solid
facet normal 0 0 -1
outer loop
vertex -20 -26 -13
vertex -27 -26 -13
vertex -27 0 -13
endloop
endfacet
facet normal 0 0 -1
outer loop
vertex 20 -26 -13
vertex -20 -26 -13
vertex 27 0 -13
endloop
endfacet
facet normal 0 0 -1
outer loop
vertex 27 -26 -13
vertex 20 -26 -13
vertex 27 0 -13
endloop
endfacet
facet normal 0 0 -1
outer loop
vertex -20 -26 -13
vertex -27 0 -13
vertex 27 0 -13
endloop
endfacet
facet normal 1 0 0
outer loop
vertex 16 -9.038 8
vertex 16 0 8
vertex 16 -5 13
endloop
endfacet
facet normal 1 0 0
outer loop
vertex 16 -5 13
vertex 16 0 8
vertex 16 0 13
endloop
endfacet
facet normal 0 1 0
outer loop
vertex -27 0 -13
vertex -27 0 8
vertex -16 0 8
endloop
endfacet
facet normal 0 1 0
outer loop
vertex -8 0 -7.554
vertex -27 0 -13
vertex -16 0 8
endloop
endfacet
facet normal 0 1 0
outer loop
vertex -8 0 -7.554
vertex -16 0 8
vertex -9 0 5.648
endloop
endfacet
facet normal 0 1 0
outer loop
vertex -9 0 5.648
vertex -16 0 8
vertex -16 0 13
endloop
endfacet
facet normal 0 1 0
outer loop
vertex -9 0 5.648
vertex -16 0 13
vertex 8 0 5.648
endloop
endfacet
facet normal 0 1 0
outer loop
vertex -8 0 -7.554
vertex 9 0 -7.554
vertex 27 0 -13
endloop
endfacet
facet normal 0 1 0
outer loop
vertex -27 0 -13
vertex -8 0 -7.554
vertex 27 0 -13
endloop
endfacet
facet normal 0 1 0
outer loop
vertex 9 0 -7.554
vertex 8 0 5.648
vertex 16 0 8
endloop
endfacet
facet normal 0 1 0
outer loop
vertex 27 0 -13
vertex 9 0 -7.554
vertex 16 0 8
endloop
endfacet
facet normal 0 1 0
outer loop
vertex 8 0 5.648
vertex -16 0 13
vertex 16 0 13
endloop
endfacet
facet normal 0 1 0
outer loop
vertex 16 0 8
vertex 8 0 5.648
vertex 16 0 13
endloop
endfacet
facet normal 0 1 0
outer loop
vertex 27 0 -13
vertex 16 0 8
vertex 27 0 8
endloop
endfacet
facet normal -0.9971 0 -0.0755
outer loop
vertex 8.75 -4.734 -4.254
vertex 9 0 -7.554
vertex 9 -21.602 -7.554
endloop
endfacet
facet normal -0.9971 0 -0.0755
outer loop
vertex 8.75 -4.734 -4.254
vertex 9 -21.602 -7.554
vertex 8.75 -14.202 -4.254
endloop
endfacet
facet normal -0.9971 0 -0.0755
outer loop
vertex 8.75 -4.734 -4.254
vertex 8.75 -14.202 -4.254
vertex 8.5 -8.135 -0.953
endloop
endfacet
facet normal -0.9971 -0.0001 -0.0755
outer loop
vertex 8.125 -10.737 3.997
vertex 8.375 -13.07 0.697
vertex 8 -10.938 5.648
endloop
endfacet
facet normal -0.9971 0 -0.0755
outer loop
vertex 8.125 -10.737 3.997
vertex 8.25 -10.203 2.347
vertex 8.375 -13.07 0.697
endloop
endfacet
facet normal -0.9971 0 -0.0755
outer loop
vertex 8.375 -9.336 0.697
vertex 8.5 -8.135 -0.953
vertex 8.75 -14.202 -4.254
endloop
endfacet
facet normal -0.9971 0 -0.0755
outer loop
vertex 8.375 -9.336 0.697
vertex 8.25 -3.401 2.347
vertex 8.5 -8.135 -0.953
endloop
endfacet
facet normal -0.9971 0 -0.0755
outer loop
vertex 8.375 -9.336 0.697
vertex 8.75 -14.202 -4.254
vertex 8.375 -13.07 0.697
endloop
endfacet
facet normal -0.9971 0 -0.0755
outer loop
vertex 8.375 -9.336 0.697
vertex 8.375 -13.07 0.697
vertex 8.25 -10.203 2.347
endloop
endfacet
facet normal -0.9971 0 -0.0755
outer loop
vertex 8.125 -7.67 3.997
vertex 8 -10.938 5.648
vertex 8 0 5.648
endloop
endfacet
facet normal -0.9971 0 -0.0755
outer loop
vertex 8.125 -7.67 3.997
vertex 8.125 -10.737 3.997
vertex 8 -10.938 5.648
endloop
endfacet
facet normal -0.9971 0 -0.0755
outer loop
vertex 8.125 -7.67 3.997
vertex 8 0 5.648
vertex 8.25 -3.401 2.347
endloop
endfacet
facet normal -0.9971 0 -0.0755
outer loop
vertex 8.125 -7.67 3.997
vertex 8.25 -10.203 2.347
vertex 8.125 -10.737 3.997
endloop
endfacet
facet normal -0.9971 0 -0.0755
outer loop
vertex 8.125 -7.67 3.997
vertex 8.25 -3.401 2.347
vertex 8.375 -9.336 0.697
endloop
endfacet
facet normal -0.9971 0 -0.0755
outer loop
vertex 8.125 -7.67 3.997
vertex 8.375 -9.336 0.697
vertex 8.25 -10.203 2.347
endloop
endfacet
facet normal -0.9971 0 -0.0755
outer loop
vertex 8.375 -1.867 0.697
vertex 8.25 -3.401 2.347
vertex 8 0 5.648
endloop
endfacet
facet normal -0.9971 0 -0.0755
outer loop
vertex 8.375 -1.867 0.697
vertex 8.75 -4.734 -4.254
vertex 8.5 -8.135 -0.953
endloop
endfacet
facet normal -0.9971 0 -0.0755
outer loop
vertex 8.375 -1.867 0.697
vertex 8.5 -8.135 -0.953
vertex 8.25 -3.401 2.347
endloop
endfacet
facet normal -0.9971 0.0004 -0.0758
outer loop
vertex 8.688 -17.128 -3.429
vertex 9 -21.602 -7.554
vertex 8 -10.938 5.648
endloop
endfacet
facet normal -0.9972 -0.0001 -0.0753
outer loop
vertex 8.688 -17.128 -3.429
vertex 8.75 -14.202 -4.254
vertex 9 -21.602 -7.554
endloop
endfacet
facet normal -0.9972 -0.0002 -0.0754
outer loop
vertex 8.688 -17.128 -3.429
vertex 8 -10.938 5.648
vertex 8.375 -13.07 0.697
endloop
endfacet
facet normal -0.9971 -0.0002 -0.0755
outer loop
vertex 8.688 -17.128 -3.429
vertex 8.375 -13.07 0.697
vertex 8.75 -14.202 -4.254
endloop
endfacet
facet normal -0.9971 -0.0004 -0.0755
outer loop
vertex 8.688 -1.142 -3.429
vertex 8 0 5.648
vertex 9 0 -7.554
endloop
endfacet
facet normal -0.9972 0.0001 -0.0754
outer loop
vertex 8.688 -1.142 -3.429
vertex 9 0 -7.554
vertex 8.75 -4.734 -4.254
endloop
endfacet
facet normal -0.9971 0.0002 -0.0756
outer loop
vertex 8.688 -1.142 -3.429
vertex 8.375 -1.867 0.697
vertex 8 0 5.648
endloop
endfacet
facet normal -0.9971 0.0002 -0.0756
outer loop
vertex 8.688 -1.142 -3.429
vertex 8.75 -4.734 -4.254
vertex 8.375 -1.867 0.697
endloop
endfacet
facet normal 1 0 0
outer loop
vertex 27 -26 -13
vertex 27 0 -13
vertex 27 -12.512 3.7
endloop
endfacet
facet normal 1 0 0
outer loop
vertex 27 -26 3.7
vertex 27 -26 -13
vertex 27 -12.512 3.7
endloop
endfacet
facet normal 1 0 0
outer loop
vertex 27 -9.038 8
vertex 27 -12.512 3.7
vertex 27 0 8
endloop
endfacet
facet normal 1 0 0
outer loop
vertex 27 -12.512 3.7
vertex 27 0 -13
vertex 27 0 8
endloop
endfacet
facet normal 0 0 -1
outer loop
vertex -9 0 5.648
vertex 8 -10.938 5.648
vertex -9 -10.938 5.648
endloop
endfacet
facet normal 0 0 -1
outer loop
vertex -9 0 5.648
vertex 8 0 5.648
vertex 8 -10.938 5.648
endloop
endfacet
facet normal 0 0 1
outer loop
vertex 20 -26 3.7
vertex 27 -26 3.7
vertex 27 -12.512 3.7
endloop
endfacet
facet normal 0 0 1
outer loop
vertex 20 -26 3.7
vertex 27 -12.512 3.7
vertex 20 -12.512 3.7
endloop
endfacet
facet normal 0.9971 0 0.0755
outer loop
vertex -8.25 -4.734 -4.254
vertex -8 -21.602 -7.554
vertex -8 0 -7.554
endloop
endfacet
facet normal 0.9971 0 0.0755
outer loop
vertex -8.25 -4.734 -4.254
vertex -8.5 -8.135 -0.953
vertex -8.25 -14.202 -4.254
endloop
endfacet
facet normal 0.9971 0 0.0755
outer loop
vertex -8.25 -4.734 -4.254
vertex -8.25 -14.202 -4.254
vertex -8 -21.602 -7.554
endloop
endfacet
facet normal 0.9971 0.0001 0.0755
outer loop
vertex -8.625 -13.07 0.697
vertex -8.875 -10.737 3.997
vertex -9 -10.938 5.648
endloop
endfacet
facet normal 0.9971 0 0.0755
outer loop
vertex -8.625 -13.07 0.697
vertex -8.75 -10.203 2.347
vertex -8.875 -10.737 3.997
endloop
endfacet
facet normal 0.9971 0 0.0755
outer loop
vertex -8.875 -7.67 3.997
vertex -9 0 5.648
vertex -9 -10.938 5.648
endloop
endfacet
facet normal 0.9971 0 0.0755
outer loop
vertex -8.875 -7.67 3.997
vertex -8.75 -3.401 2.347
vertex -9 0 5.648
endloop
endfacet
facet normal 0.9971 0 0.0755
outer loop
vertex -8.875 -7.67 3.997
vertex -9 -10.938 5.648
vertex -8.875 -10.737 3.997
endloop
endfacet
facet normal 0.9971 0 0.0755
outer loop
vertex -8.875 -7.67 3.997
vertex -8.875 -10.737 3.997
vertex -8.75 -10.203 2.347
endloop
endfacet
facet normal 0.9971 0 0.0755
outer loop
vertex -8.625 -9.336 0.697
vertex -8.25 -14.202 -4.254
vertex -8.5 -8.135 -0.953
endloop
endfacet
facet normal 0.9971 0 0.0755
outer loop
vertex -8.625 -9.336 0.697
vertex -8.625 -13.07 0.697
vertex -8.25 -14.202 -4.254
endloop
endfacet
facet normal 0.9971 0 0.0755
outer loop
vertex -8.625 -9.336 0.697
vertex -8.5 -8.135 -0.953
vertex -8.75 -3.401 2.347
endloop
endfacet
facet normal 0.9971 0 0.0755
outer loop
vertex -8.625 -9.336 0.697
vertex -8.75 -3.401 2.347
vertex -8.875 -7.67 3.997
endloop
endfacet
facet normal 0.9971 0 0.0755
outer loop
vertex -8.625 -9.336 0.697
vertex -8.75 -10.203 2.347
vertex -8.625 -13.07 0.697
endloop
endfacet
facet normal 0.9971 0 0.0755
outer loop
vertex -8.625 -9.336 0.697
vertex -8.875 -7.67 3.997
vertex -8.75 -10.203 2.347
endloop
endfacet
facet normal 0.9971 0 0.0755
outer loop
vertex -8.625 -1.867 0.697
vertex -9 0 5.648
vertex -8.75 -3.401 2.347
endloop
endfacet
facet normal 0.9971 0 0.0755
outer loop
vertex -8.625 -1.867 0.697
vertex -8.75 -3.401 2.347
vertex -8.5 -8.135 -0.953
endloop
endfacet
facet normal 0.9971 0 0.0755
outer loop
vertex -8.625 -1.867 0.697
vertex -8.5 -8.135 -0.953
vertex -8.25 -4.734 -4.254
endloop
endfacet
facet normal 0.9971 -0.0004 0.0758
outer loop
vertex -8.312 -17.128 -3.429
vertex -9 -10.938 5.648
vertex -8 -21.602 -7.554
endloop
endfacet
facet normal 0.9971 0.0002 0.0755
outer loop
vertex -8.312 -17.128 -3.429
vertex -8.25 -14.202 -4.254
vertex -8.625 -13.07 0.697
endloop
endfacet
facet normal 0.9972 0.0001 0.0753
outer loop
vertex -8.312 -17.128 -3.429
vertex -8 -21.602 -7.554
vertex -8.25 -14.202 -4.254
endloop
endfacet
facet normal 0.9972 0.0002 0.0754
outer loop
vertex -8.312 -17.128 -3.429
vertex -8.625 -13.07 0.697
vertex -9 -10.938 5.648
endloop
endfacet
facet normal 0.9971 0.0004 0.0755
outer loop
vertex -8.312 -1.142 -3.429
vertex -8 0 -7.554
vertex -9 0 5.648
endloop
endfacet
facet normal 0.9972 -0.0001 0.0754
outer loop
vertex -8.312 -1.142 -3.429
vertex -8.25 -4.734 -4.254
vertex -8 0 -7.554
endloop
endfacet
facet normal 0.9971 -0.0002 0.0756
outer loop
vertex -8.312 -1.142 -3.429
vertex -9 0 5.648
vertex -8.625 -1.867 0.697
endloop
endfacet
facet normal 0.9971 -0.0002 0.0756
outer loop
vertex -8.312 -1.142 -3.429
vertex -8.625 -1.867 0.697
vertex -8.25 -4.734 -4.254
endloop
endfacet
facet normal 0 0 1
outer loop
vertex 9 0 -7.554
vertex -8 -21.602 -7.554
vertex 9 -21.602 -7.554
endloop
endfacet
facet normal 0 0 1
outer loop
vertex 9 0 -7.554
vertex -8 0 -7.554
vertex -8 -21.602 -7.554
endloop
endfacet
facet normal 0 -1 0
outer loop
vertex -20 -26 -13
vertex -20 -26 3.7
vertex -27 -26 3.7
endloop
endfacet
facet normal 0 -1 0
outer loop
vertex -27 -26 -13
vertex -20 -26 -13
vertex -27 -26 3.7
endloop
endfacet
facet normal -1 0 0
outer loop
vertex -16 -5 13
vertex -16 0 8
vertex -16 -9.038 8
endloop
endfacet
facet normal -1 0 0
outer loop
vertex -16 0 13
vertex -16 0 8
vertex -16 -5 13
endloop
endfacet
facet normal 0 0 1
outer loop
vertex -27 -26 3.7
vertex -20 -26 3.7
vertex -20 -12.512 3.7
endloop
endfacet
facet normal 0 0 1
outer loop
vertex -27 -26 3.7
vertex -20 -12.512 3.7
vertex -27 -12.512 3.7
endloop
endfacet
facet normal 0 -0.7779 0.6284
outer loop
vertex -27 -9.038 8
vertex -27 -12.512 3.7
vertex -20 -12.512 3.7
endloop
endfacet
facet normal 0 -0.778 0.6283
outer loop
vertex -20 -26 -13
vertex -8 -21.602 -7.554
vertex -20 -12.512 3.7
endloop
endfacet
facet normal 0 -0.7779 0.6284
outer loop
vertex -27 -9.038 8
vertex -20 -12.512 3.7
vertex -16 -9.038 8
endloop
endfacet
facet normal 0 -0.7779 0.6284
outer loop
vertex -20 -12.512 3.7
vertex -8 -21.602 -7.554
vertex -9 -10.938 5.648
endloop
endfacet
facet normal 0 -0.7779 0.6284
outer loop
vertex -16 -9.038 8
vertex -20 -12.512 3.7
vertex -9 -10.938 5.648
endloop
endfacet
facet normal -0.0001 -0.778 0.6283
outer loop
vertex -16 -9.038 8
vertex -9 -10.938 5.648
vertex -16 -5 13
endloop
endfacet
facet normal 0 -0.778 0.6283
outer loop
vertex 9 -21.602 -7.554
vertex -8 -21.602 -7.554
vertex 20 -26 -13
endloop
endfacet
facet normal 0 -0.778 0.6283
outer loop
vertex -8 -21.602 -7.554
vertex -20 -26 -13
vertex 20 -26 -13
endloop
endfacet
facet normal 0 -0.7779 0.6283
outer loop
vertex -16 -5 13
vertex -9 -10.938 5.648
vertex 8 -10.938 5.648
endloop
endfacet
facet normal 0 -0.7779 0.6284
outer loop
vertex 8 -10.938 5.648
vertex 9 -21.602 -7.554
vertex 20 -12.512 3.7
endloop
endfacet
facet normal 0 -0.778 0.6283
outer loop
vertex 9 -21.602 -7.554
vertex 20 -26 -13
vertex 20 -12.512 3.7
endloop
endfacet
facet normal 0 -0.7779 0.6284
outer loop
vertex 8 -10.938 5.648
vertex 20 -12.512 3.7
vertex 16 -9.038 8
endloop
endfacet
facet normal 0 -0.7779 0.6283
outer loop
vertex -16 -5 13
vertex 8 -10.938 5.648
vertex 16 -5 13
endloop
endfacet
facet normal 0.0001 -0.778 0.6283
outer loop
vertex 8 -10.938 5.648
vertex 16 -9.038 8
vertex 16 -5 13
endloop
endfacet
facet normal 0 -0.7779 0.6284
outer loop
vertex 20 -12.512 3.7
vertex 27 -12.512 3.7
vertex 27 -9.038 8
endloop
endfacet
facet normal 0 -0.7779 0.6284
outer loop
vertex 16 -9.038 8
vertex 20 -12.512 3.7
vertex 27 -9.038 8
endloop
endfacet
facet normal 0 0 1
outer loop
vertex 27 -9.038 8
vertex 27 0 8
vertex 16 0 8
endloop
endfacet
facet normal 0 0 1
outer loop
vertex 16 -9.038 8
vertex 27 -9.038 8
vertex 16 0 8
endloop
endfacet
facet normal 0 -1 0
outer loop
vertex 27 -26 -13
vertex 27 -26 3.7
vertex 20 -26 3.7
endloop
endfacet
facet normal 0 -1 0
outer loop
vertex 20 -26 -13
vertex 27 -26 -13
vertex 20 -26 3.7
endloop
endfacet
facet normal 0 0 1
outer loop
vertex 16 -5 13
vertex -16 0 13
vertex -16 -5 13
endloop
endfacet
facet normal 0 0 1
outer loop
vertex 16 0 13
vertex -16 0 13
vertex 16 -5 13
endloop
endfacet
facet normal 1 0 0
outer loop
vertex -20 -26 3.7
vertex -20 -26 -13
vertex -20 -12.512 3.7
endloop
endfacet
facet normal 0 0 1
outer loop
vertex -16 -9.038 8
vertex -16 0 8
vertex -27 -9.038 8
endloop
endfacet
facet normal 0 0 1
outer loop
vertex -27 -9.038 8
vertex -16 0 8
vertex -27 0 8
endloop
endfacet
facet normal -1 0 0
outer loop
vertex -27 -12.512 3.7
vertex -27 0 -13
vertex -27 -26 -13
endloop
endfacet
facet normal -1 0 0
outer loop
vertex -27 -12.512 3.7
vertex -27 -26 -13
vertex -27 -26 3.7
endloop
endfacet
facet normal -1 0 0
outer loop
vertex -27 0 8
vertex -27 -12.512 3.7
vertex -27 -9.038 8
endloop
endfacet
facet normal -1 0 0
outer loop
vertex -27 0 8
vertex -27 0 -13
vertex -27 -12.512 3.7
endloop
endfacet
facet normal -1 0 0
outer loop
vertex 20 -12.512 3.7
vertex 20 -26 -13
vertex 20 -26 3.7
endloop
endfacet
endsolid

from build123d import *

# Parameters (mm, degrees)
F0_W     = 54
F0_H     = 26
F1_DEPTH = 26
F3_DEPTH = 72.1
F4_W     = 7
F4_H     = 16.7
F5_DEPTH = 26
F6_W     = 11
F6_H     = 5
F7_DEPTH = 25


with BuildPart() as f1:
    # F0 (on Front) → F1 (new body)
    with BuildSketch(Plane.XZ):
        Rectangle(F0_W, F0_H)
    extrude(amount=F1_DEPTH)

    # F2 (on face) → F3 (cut)
    with BuildSketch(Plane.YZ.offset(27)):
        Polygon((-26, -13), (-5, 13), (-26, 13), align=None)
    extrude(amount=-F3_DEPTH, mode=Mode.SUBTRACT)

    # F4 (on face) → F5 (join)
    with BuildSketch(Plane(origin=(0, 0, 0), x_dir=(-1, 0, 0), z_dir=(0, 1, 0))):
        with Locations((-23.5, -4.65)):
            Rectangle(F4_W, F4_H)
        with Locations((23.5, -4.65)):
            Rectangle(F4_W, F4_H)
    extrude(amount=-F5_DEPTH)

    # F6 (on face) → F7 (cut)
    with BuildSketch(Plane(origin=(0, 0, 0), x_dir=(-1, 0, 0), z_dir=(0, 1, 0))):
        with Locations((-21.5, 10.5)):
            Rectangle(F6_W, F6_H)
        with Locations((21.5, 10.5)):
            Rectangle(F6_W, F6_H)
    extrude(amount=-F7_DEPTH, mode=Mode.SUBTRACT)

    # F8 (on face) → F10 section 0
    with BuildSketch(Plane(origin=(0, -9.3804834378, 7.5765443151), x_dir=(1, 0, 0), z_dir=(0, -0.7779411802, 0.6283371071))):
        Polygon((-8, -19.4500001269), (9, -19.4500001269), (8, -2.4794373784), (-9, -2.4794373784), align=None)
    # F9 (on face) → F10 section 1
    with BuildSketch(Plane(origin=(0, 0, 0), x_dir=(-1, 0, 0), z_dir=(0, 1, 0))):
        Polygon((9, 5.6476878747), (-8, 5.6476878747), (-9, -7.5544117386), (8, -7.5544117386), align=None)
    loft(mode=Mode.SUBTRACT)


solid = f1.part
